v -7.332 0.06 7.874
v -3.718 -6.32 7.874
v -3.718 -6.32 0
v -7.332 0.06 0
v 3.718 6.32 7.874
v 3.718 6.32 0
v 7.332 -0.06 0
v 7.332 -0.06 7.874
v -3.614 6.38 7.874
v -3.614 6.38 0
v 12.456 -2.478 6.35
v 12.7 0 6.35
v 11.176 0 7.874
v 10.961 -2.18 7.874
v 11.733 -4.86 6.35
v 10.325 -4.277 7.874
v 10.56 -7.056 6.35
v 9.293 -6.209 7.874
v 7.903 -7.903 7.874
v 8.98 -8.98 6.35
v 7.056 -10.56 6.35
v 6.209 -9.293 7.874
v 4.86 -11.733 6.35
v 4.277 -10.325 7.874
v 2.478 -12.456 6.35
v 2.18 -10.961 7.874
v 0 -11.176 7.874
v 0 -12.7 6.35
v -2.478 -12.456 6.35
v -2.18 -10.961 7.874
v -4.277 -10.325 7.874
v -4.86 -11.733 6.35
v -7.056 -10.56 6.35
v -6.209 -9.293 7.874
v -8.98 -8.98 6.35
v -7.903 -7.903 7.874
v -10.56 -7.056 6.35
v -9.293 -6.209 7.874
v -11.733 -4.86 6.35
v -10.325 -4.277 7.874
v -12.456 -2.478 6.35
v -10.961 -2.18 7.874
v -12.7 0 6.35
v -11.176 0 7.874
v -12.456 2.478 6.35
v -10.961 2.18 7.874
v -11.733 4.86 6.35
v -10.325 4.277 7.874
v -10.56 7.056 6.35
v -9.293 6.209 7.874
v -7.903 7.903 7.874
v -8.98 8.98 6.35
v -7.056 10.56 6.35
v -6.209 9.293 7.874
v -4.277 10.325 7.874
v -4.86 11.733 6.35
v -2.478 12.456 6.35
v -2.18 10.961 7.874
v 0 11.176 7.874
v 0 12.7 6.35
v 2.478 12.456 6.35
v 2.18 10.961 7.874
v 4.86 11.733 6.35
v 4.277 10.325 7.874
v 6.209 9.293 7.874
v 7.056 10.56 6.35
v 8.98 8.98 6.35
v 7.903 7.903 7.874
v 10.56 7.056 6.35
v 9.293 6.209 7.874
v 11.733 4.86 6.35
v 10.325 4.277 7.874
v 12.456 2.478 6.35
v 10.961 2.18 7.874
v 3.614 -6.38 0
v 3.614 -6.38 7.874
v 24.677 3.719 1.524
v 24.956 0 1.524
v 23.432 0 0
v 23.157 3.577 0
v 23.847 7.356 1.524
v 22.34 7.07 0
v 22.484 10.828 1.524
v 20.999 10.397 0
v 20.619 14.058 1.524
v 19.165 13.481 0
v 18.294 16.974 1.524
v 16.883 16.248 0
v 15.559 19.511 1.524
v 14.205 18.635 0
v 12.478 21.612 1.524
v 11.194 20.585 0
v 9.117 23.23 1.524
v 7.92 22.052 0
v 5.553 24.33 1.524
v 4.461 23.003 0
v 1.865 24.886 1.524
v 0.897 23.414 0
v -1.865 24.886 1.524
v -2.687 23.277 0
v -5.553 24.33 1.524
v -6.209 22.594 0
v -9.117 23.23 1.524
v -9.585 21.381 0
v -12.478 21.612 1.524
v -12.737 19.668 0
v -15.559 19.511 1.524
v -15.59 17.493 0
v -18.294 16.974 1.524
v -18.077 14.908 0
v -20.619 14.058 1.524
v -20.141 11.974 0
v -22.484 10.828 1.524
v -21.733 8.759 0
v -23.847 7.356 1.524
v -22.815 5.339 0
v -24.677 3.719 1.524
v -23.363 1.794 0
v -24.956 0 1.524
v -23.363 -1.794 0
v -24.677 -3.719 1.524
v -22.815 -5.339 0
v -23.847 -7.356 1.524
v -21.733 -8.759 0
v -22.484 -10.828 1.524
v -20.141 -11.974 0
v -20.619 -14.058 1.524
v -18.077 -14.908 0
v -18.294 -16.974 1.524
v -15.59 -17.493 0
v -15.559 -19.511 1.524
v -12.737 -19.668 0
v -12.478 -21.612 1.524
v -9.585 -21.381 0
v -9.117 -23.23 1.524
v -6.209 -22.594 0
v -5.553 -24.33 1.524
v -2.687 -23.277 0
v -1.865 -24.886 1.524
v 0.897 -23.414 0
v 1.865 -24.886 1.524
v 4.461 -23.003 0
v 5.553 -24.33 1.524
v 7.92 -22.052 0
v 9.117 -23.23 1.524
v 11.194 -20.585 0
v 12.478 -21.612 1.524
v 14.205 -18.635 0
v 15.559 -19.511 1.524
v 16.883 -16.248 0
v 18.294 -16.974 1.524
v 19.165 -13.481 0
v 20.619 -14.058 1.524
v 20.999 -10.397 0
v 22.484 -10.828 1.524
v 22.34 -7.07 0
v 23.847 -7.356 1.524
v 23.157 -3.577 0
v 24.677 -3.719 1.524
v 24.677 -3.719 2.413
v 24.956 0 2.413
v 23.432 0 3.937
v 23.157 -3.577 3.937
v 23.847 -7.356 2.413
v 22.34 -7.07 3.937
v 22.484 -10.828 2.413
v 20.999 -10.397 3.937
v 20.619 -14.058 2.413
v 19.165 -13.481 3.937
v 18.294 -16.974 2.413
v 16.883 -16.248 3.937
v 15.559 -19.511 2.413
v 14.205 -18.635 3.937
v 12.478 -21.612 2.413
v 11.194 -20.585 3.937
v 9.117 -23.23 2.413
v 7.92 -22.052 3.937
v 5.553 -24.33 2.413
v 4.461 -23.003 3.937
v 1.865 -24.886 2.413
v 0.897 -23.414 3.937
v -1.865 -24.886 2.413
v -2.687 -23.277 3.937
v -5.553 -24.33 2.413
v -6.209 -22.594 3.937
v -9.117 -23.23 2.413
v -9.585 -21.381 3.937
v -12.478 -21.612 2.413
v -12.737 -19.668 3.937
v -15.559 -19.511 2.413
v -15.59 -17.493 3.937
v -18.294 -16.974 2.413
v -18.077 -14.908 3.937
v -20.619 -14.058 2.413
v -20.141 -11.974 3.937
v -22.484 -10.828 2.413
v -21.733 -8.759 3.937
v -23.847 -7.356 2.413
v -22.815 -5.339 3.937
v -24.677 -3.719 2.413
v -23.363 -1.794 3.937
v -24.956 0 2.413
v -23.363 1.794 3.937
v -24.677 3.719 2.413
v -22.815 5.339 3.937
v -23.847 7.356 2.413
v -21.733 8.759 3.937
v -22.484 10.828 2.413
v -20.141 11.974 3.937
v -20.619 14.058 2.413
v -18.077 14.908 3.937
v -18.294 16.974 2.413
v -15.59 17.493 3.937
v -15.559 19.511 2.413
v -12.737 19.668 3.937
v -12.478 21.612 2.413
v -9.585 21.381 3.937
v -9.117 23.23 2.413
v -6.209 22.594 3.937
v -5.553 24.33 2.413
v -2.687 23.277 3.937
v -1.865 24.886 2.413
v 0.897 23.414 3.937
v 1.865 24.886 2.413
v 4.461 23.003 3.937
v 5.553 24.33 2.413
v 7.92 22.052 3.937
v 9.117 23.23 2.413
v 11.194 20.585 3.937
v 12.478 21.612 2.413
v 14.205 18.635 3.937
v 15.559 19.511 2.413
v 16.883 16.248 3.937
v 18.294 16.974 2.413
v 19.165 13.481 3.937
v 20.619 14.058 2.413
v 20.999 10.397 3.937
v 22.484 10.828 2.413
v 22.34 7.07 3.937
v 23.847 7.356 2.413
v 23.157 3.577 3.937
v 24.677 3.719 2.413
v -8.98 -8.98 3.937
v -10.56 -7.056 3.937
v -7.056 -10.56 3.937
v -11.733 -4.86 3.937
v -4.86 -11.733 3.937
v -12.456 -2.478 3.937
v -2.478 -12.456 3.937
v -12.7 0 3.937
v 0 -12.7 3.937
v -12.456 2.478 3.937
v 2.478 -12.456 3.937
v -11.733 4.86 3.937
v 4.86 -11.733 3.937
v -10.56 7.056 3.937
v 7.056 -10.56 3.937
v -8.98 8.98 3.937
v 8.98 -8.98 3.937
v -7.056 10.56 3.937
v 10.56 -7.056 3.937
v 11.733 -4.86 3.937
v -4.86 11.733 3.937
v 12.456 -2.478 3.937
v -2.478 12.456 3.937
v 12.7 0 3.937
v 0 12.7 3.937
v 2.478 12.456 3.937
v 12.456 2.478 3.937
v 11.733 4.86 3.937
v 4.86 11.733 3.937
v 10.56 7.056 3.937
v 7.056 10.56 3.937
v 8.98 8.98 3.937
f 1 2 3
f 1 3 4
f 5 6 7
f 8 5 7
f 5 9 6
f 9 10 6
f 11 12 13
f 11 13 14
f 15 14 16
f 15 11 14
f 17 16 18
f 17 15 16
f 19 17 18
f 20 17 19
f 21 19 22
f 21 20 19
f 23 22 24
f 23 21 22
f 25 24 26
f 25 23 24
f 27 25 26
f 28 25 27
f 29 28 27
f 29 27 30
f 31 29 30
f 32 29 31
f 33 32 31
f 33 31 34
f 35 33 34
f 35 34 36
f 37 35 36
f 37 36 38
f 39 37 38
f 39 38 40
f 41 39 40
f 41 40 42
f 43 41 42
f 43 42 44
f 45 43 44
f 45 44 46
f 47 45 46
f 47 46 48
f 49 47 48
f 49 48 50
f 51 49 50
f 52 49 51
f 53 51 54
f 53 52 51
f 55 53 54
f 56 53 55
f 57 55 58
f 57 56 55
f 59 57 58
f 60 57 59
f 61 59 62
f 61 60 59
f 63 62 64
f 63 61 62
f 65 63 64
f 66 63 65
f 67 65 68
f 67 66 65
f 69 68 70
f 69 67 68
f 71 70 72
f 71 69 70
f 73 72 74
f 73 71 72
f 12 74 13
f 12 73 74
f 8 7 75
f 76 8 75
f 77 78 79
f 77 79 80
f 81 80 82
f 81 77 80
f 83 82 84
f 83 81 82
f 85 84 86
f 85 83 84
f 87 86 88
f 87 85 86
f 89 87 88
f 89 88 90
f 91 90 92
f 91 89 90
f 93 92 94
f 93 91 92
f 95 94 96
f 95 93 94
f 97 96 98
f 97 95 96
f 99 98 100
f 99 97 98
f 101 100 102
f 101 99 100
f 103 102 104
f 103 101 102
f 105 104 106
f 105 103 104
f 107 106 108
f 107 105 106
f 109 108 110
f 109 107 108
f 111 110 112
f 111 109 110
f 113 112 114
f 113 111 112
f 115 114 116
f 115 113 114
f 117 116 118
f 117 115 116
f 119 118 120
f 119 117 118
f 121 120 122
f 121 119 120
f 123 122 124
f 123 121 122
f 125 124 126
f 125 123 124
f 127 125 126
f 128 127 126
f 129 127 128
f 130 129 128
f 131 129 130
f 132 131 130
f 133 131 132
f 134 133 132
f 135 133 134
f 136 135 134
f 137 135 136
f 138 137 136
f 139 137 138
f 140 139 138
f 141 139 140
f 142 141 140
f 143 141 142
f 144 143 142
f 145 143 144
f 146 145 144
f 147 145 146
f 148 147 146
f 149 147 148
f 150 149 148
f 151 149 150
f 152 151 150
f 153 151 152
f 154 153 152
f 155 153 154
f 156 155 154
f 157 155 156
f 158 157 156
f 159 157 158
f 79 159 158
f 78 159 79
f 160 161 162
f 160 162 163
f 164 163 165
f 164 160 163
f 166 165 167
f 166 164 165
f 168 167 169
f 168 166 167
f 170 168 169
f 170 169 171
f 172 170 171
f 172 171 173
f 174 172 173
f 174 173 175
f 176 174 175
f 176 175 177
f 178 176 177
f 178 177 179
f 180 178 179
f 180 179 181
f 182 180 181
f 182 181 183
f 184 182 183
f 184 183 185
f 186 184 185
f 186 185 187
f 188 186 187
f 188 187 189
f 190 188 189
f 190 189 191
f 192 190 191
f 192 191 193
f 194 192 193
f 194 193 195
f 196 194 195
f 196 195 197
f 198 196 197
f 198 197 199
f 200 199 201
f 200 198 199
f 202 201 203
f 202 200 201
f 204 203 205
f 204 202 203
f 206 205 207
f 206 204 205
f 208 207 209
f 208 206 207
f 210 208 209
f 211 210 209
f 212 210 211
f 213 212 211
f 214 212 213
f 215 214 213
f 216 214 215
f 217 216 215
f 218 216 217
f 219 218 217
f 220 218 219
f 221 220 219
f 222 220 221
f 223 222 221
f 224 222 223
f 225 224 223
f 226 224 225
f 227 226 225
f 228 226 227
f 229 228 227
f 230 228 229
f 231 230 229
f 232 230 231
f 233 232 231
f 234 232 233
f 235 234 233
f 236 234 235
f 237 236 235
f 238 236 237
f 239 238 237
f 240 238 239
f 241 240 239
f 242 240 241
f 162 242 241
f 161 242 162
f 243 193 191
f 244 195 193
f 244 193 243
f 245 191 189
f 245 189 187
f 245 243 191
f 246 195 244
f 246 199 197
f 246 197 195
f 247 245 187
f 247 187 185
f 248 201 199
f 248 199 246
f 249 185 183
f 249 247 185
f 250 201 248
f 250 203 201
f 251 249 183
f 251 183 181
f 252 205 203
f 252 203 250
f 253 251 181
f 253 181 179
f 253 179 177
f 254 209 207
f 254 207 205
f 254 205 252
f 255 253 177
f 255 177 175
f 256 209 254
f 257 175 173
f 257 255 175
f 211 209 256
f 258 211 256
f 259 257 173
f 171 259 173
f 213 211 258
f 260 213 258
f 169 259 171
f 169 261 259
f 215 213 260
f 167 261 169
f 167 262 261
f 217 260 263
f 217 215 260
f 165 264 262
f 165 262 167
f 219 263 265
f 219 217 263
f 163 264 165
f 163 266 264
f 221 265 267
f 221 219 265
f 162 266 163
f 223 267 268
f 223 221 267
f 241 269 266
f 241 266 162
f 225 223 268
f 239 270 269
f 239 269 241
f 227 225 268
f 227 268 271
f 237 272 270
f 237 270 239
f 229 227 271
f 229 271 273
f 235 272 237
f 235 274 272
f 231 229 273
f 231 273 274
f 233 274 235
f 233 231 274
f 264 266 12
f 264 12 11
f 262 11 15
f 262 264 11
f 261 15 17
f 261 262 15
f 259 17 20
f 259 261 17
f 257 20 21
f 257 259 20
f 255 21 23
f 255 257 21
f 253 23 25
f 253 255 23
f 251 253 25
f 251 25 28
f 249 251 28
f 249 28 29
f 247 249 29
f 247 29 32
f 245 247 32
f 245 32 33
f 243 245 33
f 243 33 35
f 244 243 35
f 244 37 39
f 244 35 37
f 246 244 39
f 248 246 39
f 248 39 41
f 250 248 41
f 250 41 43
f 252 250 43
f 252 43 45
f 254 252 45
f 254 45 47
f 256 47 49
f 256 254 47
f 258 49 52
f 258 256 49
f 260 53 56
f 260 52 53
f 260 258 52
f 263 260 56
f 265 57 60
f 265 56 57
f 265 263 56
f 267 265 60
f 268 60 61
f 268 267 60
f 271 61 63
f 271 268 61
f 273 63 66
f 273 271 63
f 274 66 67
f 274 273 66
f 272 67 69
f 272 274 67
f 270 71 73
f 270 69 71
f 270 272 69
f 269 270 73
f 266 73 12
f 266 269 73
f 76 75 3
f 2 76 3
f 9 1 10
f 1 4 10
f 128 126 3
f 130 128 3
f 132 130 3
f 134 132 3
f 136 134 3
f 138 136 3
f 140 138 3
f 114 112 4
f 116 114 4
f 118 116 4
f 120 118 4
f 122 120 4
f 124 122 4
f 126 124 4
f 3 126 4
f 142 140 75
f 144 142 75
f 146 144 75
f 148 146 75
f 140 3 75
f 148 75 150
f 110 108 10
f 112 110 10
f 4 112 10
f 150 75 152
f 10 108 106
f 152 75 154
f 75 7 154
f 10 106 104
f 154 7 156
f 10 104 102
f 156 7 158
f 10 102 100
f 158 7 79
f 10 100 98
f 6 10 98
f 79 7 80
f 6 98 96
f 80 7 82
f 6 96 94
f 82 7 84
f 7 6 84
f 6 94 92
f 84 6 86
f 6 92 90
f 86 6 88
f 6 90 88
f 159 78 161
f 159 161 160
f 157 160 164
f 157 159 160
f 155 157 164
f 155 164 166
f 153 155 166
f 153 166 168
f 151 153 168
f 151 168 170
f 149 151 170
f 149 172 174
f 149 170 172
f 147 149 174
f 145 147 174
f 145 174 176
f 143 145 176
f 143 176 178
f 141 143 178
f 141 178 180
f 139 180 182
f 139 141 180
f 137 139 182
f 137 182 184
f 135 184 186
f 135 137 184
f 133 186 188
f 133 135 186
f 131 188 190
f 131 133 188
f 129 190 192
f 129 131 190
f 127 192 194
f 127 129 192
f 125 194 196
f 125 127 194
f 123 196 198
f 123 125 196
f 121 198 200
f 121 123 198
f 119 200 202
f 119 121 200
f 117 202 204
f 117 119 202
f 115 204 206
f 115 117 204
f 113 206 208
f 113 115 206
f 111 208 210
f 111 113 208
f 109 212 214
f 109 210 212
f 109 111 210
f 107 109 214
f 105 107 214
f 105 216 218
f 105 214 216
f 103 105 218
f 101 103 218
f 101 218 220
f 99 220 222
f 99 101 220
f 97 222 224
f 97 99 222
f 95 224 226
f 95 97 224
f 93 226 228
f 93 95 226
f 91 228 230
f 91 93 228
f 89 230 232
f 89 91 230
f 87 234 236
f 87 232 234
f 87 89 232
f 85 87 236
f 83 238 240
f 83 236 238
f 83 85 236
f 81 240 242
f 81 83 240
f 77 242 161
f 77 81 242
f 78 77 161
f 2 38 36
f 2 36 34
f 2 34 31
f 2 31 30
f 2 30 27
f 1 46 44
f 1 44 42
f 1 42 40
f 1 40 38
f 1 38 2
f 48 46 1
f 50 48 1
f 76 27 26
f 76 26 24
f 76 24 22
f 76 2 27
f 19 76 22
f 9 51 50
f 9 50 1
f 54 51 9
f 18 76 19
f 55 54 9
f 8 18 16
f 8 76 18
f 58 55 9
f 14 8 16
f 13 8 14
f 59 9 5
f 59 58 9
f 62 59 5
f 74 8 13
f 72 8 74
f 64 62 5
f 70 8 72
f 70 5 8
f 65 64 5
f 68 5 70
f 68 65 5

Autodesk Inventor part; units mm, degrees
ref_plane "YZ Plane" through (0, 0, 0) normal (1, 0, 0) x (0, 1, 0)
ref_plane "XZ Plane" through (0, 0, 0) normal (0, 1, 0) x (-1, 0, 0)
ref_plane "XY Plane" through (0, 0, 0) normal (0, 0, 1) x (1, 0, 0)
sketch "Sketch1" plane through (0, 0, 0) normal (0, 0, 1) x (1, 0, 0)
  circle A0 centre (0, 0) radius 24.9555
  line L0 (3.7176, 6.32) -> (7.3321, -0.0596)
  line L1 (7.3321, -0.0596) -> (3.6145, -6.3796)
  line L2 (3.6145, -6.3796) -> (-3.7176, -6.32)
  line L3 (-3.7176, -6.32) -> (-7.3321, 0.0596)
  line L4 (-7.3321, 0.0596) -> (-3.6145, 6.3796)
  line L5 (-3.6145, 6.3796) -> (3.7176, 6.32)
  dimension "d0" = 49.911
  dimension "d14" = 6.35
extrude "Extrusion3" add sketch "Sketch1" along normal blind 3.937
chamfer "Chamfer3" distance 1.524 angle 45 1 edges at (-24.9555, 0, 3.937)
chamfer "Chamfer4" distance 1.524 angle 45 1 edges at (-24.9555, 0, 0)
sketch "Sketch4" plane through (0, 0, 3.937) normal (0, 0, 1) x (1, 0, 0)
  circle A0 centre (0, 0) radius 23.4315 projected
  line L0 (3.7176, 6.32) -> (7.3321, -0.0596)
  line L1 (7.3321, -0.0596) -> (3.6145, -6.3796)
  line L2 (3.6145, -6.3796) -> (-3.7176, -6.32)
  line L3 (-3.7176, -6.32) -> (-7.3321, 0.0596)
  line L4 (-7.3321, 0.0596) -> (-3.6145, 6.3796)
  line L5 (-3.6145, 6.3796) -> (3.7176, 6.32)
  circle A1 centre (0, 0) radius 12.7
  dimension "d23" = 25.4
extrude "Extrusion4" add sketch "Sketch4" along normal blind 3.937 contours A1
chamfer "Chamfer5" distance 1.524 angle 45 1 edges at (-12.7, 0, 7.874)
properties part number "Sprocket Large"
